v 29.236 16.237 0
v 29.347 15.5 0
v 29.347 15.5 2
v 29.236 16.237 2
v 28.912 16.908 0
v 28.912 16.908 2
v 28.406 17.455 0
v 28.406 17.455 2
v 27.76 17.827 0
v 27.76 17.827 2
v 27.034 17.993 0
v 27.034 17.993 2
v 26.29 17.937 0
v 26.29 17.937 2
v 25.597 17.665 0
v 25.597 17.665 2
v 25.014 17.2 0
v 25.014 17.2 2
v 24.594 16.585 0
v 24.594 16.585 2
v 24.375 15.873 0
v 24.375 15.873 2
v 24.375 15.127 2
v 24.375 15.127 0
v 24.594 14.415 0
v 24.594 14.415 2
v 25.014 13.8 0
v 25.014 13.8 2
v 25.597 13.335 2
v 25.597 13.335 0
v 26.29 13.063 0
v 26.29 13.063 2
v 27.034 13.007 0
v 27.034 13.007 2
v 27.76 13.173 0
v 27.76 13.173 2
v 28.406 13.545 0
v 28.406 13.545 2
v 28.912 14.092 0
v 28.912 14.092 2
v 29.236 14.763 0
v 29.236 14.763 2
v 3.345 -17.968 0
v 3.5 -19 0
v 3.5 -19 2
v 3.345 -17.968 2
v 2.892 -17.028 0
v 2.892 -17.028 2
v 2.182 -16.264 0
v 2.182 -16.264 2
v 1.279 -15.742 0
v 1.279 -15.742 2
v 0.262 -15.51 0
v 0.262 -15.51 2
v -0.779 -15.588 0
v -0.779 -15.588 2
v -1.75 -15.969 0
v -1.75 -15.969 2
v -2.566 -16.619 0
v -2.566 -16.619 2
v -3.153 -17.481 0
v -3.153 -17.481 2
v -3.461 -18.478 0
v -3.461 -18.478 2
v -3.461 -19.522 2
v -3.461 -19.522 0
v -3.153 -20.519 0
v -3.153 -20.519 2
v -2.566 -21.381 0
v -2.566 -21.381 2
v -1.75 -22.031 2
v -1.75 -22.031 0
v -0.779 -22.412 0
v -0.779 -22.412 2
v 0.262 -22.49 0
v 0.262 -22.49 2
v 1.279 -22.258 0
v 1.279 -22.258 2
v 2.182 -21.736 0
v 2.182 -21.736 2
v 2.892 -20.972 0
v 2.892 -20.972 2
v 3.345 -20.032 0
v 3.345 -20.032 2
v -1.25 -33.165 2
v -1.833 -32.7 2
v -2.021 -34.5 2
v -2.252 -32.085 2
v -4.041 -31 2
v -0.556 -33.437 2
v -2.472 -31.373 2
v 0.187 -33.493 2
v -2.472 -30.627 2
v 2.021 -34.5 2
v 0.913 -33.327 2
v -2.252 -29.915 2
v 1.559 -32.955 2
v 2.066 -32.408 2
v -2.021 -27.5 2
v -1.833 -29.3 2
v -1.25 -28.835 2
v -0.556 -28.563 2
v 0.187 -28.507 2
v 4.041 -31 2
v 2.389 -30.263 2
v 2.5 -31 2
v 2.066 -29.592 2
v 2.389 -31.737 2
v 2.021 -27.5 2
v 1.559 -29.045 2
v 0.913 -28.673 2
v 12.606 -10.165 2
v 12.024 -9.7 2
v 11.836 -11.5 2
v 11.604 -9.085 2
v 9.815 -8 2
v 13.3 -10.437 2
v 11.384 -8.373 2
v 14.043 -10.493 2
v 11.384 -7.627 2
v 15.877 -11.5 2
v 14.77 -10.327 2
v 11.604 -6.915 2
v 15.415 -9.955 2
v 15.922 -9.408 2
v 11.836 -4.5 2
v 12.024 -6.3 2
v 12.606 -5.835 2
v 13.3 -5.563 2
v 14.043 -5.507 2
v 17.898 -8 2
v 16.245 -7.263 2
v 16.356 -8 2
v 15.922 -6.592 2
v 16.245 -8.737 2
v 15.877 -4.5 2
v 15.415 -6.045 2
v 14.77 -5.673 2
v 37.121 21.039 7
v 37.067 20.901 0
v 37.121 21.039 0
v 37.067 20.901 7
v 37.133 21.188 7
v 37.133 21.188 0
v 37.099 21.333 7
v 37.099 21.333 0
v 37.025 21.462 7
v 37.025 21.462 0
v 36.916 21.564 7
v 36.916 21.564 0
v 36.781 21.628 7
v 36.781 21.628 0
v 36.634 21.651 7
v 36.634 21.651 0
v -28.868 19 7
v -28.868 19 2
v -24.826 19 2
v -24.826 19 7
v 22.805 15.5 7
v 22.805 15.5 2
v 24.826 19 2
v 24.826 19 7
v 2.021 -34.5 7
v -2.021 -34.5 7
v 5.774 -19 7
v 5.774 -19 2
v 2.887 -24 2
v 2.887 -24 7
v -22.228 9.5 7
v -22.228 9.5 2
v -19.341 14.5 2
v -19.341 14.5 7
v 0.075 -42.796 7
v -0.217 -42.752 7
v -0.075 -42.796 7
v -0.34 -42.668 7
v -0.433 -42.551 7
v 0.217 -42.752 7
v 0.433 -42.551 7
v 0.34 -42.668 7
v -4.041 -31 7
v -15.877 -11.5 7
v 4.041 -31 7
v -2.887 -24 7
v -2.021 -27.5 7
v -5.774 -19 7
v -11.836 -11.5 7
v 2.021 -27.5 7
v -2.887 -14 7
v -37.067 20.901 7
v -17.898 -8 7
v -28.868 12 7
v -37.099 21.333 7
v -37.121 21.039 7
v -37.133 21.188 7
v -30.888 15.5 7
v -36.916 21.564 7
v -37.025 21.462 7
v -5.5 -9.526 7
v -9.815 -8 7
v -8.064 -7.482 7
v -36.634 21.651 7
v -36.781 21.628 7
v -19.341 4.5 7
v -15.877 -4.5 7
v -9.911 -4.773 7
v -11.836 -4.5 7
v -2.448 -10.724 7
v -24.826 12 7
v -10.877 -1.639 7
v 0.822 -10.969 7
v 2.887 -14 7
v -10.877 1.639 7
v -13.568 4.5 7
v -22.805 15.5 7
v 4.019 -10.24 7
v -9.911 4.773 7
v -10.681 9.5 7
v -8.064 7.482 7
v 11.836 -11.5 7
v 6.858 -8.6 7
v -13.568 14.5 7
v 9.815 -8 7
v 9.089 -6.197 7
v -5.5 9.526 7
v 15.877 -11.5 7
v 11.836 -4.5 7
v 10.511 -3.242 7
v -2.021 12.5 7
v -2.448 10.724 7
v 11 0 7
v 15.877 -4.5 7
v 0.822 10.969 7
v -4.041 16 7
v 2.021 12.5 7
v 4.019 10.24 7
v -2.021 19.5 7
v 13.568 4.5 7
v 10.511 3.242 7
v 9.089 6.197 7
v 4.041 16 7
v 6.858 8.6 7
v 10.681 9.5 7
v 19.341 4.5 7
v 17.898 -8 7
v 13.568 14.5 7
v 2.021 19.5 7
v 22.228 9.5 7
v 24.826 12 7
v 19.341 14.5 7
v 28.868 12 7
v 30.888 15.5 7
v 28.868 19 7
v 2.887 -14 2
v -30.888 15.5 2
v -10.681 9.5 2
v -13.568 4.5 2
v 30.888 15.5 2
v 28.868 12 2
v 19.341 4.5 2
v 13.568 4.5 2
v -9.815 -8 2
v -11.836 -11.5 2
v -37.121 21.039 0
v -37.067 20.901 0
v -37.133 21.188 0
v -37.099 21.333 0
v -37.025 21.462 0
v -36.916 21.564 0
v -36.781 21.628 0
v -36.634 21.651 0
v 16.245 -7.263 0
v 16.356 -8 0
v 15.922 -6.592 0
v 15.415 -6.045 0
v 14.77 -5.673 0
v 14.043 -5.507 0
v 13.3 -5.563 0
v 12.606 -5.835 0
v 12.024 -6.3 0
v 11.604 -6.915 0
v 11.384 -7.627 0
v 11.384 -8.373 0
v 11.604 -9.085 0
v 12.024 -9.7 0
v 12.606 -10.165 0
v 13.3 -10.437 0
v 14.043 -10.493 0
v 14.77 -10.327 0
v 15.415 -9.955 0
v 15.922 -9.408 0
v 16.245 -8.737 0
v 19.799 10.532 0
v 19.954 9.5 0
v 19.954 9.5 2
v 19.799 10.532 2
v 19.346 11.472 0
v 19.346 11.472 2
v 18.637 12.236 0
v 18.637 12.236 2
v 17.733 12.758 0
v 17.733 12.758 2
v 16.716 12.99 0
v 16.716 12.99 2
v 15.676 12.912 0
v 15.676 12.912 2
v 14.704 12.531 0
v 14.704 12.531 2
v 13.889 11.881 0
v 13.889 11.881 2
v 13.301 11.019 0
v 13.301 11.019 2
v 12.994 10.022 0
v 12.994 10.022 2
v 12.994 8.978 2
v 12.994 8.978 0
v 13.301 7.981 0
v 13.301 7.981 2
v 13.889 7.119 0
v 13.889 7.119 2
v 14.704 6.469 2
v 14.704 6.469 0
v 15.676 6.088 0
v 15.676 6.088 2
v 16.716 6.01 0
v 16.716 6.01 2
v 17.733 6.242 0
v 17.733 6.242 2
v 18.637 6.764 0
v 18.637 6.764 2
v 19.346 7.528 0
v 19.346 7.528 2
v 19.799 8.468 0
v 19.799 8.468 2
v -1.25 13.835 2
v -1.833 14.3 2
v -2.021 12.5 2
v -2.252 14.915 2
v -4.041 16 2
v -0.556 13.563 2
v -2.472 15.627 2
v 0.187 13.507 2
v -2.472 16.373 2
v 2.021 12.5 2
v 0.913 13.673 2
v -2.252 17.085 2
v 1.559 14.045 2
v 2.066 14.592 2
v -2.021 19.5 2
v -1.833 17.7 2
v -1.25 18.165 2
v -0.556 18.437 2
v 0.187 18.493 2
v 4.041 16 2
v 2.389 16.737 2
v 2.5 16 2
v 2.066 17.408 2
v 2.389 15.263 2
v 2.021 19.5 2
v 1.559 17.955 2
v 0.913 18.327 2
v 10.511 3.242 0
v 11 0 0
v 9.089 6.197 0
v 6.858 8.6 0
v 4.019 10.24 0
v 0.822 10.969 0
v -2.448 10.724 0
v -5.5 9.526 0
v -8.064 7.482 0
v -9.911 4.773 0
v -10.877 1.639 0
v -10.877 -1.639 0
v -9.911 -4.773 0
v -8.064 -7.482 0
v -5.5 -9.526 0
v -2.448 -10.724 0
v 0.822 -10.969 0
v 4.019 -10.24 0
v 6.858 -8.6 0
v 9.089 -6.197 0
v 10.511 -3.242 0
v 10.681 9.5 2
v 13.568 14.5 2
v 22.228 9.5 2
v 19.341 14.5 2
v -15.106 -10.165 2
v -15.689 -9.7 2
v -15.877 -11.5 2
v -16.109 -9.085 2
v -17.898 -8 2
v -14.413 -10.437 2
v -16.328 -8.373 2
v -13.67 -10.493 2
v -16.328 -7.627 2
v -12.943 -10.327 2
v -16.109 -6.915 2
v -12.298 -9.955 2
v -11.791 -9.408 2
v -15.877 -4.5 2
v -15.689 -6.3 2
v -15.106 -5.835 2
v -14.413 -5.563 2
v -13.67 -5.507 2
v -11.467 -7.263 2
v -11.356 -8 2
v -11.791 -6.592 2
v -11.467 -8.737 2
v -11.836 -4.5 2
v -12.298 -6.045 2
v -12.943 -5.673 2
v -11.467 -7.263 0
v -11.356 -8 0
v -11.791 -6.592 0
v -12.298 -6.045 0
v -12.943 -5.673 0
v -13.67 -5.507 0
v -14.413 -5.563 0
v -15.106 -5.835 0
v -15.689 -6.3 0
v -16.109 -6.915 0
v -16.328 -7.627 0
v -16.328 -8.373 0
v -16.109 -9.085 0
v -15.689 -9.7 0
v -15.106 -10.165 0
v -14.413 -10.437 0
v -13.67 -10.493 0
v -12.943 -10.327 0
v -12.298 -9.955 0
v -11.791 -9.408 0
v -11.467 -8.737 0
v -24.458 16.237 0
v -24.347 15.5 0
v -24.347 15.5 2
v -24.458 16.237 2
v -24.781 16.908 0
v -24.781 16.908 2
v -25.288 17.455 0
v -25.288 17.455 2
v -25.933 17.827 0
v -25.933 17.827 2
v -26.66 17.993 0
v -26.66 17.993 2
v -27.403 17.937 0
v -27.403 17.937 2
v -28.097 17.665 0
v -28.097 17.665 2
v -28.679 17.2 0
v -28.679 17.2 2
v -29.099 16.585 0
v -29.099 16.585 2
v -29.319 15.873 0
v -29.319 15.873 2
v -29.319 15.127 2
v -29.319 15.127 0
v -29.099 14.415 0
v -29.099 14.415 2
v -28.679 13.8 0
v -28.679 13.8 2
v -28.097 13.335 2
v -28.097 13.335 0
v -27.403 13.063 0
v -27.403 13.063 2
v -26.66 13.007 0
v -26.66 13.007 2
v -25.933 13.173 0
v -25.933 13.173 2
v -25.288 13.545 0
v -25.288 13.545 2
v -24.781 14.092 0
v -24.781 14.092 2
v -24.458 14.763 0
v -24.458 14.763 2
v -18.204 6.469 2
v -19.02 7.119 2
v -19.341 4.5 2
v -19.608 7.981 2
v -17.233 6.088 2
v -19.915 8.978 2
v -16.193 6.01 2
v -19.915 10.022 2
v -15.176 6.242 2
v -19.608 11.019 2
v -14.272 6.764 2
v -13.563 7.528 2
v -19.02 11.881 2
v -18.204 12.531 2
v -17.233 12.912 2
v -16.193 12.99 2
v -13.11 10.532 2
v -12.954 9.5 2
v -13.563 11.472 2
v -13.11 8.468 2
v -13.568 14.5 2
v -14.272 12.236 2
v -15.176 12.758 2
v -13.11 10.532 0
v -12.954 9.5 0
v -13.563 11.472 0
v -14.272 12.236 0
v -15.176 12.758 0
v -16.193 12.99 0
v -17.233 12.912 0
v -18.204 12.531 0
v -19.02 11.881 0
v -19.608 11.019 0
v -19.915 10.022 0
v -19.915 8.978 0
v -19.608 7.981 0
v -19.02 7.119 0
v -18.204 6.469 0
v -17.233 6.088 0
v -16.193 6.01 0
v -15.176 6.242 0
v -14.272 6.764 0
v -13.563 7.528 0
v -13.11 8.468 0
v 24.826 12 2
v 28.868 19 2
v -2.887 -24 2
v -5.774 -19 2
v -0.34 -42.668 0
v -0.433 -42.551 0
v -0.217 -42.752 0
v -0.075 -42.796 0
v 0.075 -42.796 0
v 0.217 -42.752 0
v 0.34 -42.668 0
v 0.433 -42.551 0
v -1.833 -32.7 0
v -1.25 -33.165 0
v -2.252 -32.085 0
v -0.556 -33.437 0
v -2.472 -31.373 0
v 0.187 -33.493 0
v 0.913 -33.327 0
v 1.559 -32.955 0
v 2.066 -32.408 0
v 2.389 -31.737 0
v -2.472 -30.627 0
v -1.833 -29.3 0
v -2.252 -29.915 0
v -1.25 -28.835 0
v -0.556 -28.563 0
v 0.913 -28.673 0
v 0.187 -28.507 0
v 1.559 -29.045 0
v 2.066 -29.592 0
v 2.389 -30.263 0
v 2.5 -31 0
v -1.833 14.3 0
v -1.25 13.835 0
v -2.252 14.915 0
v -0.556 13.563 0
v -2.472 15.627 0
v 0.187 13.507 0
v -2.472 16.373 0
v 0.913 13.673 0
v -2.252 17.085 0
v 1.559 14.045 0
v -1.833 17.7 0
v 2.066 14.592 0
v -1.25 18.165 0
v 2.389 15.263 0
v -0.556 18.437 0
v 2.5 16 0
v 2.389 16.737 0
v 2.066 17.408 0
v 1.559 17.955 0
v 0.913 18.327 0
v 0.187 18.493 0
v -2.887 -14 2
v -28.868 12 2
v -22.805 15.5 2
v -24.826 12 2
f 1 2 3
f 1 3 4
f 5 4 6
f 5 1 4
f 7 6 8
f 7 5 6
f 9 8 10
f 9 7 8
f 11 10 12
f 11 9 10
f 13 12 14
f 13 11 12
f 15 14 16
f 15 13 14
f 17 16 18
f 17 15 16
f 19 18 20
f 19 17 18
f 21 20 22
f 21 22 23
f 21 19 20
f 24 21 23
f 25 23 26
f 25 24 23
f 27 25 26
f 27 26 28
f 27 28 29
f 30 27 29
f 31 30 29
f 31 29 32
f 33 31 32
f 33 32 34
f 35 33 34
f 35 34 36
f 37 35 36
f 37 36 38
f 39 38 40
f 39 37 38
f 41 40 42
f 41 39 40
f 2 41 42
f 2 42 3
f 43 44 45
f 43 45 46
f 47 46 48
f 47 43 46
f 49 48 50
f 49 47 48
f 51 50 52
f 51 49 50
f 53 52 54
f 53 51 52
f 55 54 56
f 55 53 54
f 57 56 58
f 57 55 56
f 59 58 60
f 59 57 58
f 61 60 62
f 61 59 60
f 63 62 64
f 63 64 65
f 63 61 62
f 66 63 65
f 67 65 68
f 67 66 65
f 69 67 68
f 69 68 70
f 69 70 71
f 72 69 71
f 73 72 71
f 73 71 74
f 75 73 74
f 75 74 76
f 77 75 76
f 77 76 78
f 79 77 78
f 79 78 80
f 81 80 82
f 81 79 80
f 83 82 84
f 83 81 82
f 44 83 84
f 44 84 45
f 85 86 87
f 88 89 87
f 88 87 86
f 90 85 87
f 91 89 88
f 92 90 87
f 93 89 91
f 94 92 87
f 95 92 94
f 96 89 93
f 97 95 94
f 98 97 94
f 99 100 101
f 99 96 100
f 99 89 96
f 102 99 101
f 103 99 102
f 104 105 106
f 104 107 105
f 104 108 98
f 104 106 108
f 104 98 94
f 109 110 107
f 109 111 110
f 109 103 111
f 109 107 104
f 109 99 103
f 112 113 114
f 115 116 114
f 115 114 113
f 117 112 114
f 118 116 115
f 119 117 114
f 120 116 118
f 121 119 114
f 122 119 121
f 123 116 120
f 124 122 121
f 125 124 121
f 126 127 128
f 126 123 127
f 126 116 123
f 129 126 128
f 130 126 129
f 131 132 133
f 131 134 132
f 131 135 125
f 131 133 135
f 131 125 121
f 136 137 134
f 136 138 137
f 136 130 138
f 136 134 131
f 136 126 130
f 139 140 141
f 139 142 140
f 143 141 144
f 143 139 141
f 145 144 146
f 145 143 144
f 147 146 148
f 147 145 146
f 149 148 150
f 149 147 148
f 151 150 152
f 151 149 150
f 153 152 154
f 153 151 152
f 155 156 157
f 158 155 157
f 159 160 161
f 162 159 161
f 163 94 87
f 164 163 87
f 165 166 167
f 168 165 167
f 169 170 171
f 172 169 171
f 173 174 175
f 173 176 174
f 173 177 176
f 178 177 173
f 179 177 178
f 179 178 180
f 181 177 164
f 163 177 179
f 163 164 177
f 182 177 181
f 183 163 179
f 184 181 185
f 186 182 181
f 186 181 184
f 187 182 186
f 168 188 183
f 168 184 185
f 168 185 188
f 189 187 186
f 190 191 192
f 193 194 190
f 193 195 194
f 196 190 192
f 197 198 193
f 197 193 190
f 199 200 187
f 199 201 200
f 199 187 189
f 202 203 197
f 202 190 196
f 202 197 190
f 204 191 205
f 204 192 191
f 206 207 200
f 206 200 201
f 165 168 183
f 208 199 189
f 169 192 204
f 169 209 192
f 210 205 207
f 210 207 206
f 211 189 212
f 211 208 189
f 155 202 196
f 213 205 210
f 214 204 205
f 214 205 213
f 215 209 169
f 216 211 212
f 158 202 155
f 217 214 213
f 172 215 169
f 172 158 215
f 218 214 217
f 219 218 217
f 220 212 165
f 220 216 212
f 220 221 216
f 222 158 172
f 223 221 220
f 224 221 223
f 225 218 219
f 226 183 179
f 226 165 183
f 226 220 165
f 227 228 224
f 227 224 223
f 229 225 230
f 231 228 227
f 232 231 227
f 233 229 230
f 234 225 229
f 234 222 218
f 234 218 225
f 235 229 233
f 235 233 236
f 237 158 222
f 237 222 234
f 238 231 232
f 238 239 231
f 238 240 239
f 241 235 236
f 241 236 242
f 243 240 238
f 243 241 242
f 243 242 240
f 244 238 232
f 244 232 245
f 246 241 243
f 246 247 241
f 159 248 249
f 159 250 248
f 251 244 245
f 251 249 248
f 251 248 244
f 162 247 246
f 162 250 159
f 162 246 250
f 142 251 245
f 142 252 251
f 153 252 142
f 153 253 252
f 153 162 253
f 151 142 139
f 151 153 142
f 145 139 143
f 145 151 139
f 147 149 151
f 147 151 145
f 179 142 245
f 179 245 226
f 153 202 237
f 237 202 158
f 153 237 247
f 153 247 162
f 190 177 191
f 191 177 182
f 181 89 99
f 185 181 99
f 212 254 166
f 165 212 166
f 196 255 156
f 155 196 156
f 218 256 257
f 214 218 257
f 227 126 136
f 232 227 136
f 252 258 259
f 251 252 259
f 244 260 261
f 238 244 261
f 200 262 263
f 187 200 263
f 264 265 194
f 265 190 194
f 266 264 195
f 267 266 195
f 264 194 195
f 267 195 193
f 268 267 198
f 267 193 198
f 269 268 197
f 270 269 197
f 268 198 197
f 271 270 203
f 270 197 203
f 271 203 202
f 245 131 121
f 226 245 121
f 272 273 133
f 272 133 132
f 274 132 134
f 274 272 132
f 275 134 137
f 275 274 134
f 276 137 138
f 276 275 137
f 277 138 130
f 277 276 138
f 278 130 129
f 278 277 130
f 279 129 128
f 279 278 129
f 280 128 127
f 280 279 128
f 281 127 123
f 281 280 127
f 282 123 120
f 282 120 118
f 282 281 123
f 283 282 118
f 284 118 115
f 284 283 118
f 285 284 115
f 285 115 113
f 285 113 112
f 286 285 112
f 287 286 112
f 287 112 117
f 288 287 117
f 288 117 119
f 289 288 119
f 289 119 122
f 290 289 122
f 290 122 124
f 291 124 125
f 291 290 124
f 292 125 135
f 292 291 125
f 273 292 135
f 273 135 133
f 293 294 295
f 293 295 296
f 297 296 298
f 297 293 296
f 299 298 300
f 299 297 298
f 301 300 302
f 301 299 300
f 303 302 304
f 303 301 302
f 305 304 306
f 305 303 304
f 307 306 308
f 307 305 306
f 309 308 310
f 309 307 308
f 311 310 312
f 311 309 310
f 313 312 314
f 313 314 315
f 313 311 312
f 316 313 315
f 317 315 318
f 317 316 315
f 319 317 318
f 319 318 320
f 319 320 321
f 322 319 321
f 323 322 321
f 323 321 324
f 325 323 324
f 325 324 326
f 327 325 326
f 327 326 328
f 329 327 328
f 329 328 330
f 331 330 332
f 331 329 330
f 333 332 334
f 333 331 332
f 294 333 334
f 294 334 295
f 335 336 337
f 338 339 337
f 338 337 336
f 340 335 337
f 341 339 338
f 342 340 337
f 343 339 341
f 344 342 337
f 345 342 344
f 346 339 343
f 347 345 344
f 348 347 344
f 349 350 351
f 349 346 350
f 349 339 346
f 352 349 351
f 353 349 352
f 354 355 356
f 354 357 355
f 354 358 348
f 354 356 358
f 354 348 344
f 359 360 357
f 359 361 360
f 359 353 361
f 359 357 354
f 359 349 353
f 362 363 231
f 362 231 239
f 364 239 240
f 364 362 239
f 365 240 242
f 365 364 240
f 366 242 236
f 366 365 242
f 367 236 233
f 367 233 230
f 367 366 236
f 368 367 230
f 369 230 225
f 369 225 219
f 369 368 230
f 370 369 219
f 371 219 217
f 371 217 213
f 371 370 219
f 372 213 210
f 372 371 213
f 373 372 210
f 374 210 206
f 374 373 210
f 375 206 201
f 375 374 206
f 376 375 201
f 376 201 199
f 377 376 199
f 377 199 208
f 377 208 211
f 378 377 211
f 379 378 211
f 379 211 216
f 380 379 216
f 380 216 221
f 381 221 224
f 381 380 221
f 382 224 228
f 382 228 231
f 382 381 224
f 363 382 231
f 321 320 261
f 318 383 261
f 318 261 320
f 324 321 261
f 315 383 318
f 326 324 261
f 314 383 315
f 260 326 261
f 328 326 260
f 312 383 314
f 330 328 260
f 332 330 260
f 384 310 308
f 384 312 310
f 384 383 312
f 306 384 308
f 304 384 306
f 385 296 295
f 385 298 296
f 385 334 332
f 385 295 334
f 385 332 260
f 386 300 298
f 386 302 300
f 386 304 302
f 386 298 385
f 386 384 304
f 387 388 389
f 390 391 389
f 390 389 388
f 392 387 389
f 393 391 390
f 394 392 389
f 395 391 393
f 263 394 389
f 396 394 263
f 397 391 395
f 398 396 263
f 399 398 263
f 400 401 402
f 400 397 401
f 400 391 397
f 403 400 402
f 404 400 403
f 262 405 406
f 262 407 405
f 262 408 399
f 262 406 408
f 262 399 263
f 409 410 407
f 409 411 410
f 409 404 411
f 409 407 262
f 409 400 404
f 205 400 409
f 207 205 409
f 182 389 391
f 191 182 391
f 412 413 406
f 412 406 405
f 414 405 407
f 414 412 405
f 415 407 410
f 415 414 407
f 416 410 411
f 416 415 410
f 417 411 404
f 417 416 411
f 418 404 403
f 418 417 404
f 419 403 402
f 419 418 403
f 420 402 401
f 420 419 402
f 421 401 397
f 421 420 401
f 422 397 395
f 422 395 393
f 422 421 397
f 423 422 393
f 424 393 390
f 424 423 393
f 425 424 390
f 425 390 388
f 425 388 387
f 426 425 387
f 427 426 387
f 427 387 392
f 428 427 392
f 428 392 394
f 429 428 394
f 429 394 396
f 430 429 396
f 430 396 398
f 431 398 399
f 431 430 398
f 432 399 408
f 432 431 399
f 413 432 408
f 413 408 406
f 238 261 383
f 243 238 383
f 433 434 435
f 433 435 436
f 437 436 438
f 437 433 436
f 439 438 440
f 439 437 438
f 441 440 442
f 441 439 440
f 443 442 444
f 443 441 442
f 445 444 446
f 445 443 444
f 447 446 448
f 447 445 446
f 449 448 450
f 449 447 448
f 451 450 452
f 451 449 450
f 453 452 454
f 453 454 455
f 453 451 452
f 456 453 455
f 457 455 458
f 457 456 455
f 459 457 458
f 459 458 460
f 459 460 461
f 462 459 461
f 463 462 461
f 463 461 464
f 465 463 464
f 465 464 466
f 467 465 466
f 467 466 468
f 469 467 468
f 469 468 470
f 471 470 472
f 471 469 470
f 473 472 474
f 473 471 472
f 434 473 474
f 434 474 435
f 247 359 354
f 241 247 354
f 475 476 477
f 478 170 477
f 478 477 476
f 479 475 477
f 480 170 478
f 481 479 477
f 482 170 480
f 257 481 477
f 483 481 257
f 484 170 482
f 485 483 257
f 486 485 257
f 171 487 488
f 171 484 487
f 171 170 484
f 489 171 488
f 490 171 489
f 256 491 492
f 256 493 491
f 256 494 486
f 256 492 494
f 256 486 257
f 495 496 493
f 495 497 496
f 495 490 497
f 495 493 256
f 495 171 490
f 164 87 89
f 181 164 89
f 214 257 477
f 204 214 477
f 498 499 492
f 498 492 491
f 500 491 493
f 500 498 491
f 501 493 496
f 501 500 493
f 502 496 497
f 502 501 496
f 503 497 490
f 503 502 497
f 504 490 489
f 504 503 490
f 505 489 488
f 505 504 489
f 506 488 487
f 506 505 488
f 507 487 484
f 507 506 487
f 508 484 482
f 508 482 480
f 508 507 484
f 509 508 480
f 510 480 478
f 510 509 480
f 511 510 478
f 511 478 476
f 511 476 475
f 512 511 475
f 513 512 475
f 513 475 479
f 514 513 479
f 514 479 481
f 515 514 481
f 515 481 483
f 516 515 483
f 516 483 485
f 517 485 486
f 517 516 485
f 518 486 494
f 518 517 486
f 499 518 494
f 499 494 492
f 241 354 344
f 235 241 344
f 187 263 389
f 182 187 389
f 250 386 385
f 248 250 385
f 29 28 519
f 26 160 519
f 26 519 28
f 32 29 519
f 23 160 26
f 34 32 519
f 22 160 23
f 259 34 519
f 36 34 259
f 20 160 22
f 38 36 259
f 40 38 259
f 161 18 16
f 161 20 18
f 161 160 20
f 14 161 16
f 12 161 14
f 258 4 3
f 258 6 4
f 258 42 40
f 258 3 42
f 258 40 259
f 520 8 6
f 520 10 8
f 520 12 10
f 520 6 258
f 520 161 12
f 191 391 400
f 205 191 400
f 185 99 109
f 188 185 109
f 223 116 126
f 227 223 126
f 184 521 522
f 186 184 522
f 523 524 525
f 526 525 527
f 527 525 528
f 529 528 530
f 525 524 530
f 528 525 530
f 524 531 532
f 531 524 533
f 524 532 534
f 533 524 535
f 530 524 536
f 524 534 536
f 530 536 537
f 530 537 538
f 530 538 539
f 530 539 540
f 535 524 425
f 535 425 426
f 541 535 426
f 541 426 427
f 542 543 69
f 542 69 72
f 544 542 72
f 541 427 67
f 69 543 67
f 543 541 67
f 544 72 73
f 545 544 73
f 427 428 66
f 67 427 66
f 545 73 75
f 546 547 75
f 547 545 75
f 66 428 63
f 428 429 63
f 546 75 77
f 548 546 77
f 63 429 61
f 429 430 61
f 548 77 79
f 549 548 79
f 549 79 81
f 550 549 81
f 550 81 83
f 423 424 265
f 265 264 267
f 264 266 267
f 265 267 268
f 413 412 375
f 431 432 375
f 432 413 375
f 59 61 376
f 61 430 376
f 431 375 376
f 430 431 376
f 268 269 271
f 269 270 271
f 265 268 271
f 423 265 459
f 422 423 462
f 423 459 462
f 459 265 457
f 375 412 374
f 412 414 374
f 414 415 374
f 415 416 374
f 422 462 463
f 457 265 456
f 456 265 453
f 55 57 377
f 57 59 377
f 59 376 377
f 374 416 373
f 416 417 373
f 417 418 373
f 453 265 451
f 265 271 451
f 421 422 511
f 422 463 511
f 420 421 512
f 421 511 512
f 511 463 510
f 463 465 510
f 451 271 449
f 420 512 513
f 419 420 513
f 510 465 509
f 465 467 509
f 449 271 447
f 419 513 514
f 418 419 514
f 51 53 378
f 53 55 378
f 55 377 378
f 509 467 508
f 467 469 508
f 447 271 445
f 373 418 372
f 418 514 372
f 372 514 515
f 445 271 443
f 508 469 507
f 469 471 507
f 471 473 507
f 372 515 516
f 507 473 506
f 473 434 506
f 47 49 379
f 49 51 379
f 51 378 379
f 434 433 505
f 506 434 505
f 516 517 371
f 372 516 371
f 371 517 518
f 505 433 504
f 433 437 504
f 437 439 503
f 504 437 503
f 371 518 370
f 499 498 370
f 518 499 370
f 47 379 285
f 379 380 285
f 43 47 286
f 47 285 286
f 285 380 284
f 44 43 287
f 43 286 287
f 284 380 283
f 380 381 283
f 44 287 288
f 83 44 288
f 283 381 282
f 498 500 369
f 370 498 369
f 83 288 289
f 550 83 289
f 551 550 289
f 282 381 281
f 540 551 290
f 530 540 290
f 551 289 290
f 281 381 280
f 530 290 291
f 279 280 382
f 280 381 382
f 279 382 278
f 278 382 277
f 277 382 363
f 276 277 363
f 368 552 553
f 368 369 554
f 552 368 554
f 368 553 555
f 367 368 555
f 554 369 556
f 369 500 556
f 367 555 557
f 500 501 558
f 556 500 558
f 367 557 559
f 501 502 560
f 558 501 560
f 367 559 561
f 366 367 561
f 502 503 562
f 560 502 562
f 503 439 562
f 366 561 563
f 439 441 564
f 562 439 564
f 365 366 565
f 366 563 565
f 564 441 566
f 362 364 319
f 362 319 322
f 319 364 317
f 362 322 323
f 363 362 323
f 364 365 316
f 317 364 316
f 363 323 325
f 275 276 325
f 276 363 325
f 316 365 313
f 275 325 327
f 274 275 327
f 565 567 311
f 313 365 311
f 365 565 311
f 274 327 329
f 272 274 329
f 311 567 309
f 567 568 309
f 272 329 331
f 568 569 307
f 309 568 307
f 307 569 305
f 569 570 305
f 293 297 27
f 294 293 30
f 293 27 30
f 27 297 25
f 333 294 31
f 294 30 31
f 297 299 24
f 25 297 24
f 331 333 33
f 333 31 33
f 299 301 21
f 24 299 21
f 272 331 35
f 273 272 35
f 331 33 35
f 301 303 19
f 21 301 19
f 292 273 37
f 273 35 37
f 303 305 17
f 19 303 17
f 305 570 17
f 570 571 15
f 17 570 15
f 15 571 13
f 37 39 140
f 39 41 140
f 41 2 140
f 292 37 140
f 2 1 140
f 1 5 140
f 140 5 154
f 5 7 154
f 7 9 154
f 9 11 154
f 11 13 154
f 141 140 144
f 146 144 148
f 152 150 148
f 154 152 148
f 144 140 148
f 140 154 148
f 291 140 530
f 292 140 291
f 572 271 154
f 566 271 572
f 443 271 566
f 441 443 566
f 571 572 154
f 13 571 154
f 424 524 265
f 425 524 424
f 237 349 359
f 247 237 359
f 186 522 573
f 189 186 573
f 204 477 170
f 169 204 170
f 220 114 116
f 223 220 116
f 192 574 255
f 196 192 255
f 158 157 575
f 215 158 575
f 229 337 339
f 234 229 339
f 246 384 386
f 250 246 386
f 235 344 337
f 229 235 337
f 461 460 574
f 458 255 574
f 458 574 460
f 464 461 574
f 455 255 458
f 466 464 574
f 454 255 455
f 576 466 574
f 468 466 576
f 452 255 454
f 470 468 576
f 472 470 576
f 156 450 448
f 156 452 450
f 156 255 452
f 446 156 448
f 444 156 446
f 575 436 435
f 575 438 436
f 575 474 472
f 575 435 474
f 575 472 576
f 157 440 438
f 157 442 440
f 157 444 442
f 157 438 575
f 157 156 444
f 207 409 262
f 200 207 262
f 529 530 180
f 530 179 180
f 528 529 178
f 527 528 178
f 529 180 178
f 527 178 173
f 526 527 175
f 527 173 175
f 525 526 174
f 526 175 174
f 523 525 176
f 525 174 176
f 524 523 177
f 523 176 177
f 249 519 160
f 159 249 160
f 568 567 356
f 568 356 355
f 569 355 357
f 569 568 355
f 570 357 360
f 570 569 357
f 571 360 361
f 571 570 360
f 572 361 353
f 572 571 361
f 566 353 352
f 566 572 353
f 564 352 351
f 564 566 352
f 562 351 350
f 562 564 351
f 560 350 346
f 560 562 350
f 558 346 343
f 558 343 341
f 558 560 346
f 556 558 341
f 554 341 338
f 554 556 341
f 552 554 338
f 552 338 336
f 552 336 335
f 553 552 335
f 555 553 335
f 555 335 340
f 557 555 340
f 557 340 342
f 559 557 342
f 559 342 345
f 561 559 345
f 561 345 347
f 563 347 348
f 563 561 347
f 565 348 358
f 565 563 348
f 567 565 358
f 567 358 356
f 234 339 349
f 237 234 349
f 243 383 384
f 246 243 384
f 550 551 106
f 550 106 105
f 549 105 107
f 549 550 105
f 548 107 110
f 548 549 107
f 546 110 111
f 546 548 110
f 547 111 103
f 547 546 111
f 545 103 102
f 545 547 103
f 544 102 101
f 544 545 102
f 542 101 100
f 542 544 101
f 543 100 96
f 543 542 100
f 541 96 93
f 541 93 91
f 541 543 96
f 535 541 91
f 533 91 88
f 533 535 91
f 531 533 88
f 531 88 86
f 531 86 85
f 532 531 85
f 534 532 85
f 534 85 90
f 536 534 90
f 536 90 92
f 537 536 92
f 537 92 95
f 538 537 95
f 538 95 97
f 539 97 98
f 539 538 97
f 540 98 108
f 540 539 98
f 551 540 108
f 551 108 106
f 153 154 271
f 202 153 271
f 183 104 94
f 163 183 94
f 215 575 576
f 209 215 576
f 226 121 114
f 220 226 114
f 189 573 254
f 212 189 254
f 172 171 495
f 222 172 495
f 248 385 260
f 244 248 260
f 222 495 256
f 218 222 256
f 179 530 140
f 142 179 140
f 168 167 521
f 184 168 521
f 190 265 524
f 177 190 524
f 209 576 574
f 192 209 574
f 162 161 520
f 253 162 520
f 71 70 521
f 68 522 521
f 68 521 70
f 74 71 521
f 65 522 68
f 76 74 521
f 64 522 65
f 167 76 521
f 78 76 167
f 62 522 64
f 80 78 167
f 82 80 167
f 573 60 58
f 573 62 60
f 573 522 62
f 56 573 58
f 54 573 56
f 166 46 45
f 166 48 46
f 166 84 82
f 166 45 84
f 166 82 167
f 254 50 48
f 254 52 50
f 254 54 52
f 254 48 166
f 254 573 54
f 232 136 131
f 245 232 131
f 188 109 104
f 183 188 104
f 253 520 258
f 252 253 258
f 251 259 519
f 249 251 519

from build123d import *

# Parameters (mm, degrees)
F0_R     = 11
F1_DEPTH = 7
F2_R     = 0.5
F0_R_2   = 2.5
F0_R_3   = 3.5
F3_DEPTH = 2


with BuildPart() as f1:
    # F0 (on Top) → F1 (new body)
    with BuildSketch(Plane.XY):
        Polygon((0, -43.30127), (37.5, 21.650635), (-37.5, 21.650635), align=None)
        Polygon((4.041452, -31), (2.020726, -34.5), (-2.020726, -34.5), (-4.041452, -31), (-2.020726, -27.5), (2.020726, -27.5), align=None, mode=Mode.SUBTRACT)
        Polygon((2.886751, -14), (5.773503, -19), (2.886751, -24), (-2.886751, -24), (-5.773503, -19), (-2.886751, -14), align=None, mode=Mode.SUBTRACT)
        Polygon((-9.814955, -8), (-11.835681, -11.5), (-15.877132, -11.5), (-17.897858, -8), (-15.877132, -4.5), (-11.835681, -4.5), align=None, mode=Mode.SUBTRACT)
        Polygon((-22.805336, 15.5), (-24.826062, 12), (-28.867513, 12), (-30.888239, 15.5), (-28.867513, 19), (-24.826062, 19), align=None, mode=Mode.SUBTRACT)
        Polygon((-13.567731, 4.5), (-19.341234, 4.5), (-22.227985, 9.5), (-19.341234, 14.5), (-13.567731, 14.5), (-10.68098, 9.5), align=None, mode=Mode.SUBTRACT)
        Polygon((9.814955, -8), (11.835681, -4.5), (15.877132, -4.5), (17.897858, -8), (15.877132, -11.5), (11.835681, -11.5), align=None, mode=Mode.SUBTRACT)
        Circle(F0_R, mode=Mode.SUBTRACT)
        Polygon((22.227985, 9.5), (19.341234, 4.5), (13.567731, 4.5), (10.68098, 9.5), (13.567731, 14.5), (19.341234, 14.5), align=None, mode=Mode.SUBTRACT)
        Polygon((-2.020726, 19.5), (2.020726, 19.5), (4.041452, 16), (2.020726, 12.5), (-2.020726, 12.5), (-4.041452, 16), align=None, mode=Mode.SUBTRACT)
        Polygon((30.888239, 15.5), (28.867513, 12), (24.826062, 12), (22.805336, 15.5), (24.826062, 19), (28.867513, 19), align=None, mode=Mode.SUBTRACT)
    extrude(amount=F1_DEPTH)

    # F2
    f2_edges = [f1.edges().sort_by_distance(p)[0] for p in [
        (0, -43.30127, 3.5),
        (-37.5, 21.650635, 3.5),
        (37.5, 21.650635, 3.5),
    ]]
    fillet(f2_edges, radius=F2_R)

    # F0 (on Top) → F3 (join)
    with BuildSketch(Plane.XY):
        Polygon((4.041452, 16), (2.020726, 19.5), (-2.020726, 19.5), (-4.041452, 16), (-2.020726, 12.5), (2.020726, 12.5), align=None)
        with Locations((0, 16)):
            Circle(F0_R_2, mode=Mode.SUBTRACT)
        Polygon((-22.227985, 9.5), (-19.341234, 4.5), (-13.567731, 4.5), (-10.68098, 9.5), (-13.567731, 14.5), (-19.341234, 14.5), align=None)
        with Locations((-16.454483, 9.5)):
            Circle(F0_R_3, mode=Mode.SUBTRACT)
        Polygon((-15.877132, -11.5), (-11.835681, -11.5), (-9.814955, -8), (-11.835681, -4.5), (-15.877132, -4.5), (-17.897858, -8), align=None)
        with Locations((-13.856406, -8)):
            Circle(F0_R_2, mode=Mode.SUBTRACT)
        Polygon((-28.867513, 12), (-24.826062, 12), (-22.805336, 15.5), (-24.826062, 19), (-28.867513, 19), (-30.888239, 15.5), align=None)
        with Locations((-26.846788, 15.5)):
            Circle(F0_R_2, mode=Mode.SUBTRACT)
        Polygon((2.886751, -24), (5.773503, -19), (2.886751, -14), (-2.886751, -14), (-5.773503, -19), (-2.886751, -24), align=None)
        with Locations((0, -19)):
            Circle(F0_R_3, mode=Mode.SUBTRACT)
        Polygon((-2.020726, -34.5), (2.020726, -34.5), (4.041452, -31), (2.020726, -27.5), (-2.020726, -27.5), (-4.041452, -31), align=None)
        with Locations((0, -31)):
            Circle(F0_R_2, mode=Mode.SUBTRACT)
        Polygon((15.877132, -4.5), (11.835681, -4.5), (9.814955, -8), (11.835681, -11.5), (15.877132, -11.5), (17.897858, -8), align=None)
        with Locations((13.856406, -8)):
            Circle(F0_R_2, mode=Mode.SUBTRACT)
        Polygon((13.567731, 4.5), (19.341234, 4.5), (22.227985, 9.5), (19.341234, 14.5), (13.567731, 14.5), (10.68098, 9.5), align=None)
        with Locations((16.454483, 9.5)):
            Circle(F0_R_3, mode=Mode.SUBTRACT)
        Polygon((24.826062, 12), (28.867513, 12), (30.888239, 15.5), (28.867513, 19), (24.826062, 19), (22.805336, 15.5), align=None)
        with Locations((26.846788, 15.5)):
            Circle(F0_R_2, mode=Mode.SUBTRACT)
    extrude(amount=F3_DEPTH)


solid = f1.part
